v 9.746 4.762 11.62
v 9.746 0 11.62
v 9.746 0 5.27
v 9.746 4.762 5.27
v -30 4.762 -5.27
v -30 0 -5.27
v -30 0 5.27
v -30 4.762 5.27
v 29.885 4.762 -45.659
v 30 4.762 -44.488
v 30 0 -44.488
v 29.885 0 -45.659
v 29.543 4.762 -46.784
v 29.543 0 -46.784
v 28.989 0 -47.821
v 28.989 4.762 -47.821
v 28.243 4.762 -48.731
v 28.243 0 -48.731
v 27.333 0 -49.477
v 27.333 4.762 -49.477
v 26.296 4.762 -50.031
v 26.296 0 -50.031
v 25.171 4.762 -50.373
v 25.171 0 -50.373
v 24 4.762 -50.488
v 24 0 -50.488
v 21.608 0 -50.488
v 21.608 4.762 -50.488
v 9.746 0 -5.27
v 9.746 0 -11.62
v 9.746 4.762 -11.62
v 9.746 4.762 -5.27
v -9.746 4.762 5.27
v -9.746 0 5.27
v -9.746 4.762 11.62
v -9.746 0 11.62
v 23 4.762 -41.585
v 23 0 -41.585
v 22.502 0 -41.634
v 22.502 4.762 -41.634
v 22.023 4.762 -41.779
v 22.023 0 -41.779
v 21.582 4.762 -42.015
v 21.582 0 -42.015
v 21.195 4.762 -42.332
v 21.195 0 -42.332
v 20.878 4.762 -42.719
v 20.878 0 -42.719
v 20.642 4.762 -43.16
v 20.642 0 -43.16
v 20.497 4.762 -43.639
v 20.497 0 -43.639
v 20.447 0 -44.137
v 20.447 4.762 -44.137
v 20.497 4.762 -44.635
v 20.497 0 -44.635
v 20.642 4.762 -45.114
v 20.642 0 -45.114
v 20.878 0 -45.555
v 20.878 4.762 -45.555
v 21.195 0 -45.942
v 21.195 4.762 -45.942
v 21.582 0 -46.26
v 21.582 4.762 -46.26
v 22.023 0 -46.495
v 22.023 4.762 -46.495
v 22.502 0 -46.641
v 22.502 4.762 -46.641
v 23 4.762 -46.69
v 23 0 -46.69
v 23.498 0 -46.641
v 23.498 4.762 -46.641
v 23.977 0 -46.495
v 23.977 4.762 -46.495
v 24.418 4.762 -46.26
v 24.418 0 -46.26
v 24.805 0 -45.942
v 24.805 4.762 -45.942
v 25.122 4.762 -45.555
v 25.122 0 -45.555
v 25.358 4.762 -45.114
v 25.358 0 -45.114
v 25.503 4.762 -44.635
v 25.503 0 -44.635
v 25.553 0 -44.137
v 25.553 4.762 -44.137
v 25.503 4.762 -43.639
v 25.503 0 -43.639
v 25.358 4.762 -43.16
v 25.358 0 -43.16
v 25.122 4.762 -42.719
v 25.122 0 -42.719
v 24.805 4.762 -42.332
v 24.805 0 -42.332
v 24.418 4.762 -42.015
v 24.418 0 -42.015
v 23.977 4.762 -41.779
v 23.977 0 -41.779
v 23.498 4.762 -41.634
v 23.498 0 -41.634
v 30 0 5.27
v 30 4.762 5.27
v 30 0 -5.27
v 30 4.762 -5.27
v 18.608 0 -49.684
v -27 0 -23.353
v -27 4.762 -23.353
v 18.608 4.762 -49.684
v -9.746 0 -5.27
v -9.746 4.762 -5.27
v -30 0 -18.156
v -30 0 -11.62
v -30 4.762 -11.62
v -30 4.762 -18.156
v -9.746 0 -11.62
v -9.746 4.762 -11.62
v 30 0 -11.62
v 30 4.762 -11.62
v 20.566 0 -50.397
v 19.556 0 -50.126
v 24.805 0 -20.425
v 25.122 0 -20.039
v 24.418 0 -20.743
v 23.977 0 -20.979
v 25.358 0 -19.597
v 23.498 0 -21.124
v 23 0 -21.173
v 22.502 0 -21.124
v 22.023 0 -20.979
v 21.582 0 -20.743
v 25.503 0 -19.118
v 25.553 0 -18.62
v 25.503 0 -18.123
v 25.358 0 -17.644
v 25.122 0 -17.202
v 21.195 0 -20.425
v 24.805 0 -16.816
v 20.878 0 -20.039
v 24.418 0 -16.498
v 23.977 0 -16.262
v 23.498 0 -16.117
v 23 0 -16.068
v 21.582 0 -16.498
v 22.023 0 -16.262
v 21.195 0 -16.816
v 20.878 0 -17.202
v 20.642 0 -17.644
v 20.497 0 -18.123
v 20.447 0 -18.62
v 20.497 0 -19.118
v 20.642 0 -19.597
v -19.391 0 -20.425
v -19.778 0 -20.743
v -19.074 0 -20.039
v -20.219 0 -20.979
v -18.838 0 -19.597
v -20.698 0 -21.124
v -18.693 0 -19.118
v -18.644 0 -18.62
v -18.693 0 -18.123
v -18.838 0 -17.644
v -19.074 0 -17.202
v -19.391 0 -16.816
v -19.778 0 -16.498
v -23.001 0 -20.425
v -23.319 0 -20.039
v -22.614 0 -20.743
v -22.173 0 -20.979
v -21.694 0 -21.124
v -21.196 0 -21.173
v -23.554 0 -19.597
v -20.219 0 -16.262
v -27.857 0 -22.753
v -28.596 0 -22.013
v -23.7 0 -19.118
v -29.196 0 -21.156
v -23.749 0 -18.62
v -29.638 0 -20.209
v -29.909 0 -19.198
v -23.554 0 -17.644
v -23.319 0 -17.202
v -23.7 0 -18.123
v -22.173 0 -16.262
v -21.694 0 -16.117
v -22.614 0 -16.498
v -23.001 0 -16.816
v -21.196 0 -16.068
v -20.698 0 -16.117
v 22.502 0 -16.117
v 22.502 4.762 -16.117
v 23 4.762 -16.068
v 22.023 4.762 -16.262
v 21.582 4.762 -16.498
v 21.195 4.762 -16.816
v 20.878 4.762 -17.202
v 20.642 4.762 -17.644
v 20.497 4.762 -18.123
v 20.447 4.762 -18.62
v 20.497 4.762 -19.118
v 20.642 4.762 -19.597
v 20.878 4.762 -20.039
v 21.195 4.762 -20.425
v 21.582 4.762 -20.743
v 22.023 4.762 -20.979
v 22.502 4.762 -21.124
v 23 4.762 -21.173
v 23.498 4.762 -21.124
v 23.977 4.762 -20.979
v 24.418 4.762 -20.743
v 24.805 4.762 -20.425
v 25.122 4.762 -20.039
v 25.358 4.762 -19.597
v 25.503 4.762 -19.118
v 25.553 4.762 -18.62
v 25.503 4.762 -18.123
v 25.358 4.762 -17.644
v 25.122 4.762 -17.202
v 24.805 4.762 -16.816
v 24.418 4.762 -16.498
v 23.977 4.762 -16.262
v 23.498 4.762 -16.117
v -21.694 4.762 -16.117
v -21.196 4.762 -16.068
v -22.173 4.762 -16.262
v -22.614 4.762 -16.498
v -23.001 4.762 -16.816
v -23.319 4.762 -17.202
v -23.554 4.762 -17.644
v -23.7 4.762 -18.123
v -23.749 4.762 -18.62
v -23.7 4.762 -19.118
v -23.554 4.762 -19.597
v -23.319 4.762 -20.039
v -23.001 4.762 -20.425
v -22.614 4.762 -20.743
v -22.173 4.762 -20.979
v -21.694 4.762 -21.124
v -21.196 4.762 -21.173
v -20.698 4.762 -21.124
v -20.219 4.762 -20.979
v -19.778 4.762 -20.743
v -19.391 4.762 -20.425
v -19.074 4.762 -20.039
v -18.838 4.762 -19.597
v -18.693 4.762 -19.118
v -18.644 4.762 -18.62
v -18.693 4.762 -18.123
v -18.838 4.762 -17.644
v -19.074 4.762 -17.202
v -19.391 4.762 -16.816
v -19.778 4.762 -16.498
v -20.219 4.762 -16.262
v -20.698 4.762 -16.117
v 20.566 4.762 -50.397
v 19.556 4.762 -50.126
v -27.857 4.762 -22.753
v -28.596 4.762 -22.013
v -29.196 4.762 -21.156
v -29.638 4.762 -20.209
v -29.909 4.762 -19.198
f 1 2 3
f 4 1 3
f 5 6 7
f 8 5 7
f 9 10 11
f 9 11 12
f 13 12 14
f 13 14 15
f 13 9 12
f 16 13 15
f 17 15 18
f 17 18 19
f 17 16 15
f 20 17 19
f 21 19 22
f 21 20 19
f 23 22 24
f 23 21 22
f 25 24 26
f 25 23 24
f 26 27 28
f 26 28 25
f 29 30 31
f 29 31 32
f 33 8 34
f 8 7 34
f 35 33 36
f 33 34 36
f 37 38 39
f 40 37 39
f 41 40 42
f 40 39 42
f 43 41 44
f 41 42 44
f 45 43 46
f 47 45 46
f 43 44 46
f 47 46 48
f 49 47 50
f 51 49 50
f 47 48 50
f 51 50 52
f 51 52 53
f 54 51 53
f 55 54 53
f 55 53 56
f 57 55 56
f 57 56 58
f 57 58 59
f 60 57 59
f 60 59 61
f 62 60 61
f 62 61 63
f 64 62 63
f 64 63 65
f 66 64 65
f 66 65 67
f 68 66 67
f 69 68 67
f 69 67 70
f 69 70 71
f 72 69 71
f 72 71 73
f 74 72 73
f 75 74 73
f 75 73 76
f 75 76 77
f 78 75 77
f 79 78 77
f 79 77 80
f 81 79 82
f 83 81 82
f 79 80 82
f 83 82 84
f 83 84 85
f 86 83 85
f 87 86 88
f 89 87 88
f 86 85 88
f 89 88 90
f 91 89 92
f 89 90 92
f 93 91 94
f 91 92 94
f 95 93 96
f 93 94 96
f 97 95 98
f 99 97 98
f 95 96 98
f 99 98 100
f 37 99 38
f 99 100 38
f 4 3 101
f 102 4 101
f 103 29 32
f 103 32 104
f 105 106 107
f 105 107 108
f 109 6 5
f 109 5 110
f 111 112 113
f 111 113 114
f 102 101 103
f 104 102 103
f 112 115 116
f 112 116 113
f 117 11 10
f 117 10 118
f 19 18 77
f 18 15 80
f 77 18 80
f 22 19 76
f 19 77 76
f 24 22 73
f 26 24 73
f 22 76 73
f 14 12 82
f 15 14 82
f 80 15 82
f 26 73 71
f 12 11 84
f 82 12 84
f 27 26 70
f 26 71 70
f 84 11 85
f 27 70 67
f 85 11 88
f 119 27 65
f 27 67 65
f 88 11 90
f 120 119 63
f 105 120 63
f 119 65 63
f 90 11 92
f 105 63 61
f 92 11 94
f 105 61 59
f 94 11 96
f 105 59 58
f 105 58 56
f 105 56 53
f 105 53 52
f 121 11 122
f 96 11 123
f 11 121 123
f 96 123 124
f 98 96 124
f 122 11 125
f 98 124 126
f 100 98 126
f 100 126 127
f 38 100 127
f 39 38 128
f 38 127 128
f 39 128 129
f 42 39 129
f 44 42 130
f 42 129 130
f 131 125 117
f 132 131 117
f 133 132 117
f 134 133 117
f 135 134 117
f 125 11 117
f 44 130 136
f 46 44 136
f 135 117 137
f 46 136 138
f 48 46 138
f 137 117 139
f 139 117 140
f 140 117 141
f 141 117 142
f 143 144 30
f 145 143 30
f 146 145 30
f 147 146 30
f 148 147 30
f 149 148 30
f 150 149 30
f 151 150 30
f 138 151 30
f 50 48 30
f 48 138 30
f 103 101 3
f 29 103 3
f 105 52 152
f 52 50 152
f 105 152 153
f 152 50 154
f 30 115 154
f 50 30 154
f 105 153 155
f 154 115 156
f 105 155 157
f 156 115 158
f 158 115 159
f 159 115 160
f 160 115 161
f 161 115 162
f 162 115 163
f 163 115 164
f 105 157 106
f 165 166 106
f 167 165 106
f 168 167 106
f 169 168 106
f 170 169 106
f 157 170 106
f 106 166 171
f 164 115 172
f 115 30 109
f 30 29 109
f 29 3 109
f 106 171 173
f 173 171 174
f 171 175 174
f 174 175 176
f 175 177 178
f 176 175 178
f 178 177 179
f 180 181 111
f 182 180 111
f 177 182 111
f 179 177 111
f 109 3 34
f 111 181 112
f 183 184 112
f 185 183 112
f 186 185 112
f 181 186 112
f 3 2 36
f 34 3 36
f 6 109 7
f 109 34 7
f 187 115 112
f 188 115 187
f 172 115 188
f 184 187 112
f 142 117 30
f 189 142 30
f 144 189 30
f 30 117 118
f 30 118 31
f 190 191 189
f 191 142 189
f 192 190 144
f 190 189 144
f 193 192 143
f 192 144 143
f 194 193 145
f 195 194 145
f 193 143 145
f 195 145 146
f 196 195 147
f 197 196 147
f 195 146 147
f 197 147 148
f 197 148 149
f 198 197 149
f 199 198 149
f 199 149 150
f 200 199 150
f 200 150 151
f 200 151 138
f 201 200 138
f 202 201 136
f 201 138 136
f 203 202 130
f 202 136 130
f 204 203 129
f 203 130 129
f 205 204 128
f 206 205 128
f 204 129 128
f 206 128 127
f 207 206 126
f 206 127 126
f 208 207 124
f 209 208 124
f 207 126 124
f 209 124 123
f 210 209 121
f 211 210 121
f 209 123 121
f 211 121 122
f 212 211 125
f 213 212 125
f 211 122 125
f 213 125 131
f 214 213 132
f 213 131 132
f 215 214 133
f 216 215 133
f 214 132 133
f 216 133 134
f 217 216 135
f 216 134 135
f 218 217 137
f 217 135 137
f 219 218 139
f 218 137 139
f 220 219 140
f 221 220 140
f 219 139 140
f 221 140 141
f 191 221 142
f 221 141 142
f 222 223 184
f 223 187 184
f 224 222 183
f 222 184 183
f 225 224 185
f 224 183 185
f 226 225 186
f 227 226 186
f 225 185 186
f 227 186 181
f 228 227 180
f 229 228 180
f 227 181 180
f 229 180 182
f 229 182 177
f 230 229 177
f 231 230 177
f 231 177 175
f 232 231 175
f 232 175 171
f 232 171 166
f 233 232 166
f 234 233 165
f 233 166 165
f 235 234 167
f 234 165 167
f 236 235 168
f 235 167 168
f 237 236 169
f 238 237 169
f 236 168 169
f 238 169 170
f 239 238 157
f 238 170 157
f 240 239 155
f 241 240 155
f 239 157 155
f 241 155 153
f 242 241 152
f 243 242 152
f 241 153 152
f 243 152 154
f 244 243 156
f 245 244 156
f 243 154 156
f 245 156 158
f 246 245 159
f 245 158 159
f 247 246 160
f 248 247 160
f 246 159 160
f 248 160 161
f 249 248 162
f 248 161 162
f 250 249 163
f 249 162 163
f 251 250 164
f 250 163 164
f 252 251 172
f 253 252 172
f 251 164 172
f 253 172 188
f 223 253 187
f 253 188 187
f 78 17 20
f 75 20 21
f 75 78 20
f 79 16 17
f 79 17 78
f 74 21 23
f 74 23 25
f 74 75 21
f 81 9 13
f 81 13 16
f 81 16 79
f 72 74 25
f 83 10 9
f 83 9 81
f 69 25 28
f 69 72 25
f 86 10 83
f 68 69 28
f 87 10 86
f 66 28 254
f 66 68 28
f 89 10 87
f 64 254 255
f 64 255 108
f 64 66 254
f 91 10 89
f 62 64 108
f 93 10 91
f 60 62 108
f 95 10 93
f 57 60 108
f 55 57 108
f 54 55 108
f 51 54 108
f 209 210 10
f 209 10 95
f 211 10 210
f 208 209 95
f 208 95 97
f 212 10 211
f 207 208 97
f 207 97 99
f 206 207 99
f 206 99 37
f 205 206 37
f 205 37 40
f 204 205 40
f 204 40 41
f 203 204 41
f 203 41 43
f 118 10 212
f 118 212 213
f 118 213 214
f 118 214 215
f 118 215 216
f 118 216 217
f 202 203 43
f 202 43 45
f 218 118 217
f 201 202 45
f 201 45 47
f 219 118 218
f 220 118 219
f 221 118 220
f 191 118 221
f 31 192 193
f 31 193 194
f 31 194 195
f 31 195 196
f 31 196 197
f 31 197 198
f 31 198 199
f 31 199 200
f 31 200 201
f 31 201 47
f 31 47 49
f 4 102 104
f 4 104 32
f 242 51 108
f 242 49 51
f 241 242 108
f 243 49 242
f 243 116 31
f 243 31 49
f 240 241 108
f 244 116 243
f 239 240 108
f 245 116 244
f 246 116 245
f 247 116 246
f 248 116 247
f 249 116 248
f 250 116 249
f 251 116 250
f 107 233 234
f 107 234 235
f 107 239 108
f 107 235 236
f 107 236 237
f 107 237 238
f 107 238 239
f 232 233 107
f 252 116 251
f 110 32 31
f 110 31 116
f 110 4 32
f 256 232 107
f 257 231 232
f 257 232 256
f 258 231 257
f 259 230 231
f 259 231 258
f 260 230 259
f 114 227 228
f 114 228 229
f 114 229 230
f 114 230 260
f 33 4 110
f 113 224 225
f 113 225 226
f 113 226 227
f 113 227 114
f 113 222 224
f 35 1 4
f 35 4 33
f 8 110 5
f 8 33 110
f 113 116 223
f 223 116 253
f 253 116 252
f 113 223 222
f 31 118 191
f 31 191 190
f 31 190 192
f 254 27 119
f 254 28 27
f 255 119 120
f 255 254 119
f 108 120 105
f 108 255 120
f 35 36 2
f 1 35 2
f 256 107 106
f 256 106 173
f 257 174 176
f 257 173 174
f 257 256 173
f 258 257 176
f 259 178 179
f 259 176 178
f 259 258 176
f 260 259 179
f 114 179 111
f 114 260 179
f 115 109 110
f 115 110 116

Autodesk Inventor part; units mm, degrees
ref_plane "YZ Plane" through (0, 0, 0) normal (1, 0, 0) x (0, 1, 0)
ref_plane "XZ Plane" through (0, 0, 0) normal (0, 1, 0) x (-1, 0, 0)
ref_plane "XY Plane" through (0, 0, 0) normal (0, 0, 1) x (1, 0, 0)
sketch "Sketch1" plane through (0, 0, 0) normal (0, 1, 0) x (-1, 0, 0)
  line L0 (-30, -11.6205) -> (30, -11.6205)
  line L1 (30, -11.6205) -> (30, 11.6205)
  line L2 (30, 11.6205) -> (-30, 11.6205)
  line L3 (-30, 11.6205) -> (-30, -11.6205)
  line L4 (-30, -11.6205) -> (30, 11.6205) construction
  line L5 (30, -11.6205) -> (-30, 11.6205) construction
  line L6 (-9.746, 11.6205) -> (-9.746, 5.2705)
  line L7 (-9.746, 5.2705) -> (-30, 5.2705)
  line L8 (30, 5.2705) -> (9.746, 5.2705)
  line L9 (9.746, 5.2705) -> (9.746, 11.6205)
  line L10 (30, 0) -> (0, 0) construction
  line L11 (-9.746, -11.6205) -> (-9.746, -5.2705)
  line L12 (-9.746, -5.2705) -> (-30, -5.2705)
  line L13 (30, -5.2705) -> (9.746, -5.2705)
  line L14 (9.746, -5.2705) -> (9.746, -11.6205)
  line L15 (30, -11.6205) -> (30, -21.6205)
  line L16 (30, -21.6205) -> (-20, -50.488)
  line L17 (-20, -50.488) -> (-30, -50.488)
  line L18 (-30, -50.488) -> (-30, -11.6205)
  dimension "d0" = 20.254
  dimension "d1" = 20.254
  dimension "d2" = 6.35
  dimension "d3" = 60
  dimension "d4" = 23.241
  dimension "d5" = 10
  dimension "d6" = 10
  dimension "d7" = 60
extrude "Plate1" add sketch "Sketch1" along normal blind 4.7625 contours L0 L15 L16 L17 L18 | L11 L12 L3 L7 L6 L2 L9 L8 L1 L13 L14 L0
fillet "Corner Round1" radius 6 3 edges at (-30, 2.3813, -21.6205) (20, 2.3813, -50.488) (30, 2.3813, -50.488)
sketch "Sketch2" plane through (0, 4.7625, 0) normal (0, 1, 0) x (1, 0, 0)
  line L0 (-21.1962, 18.6205) -> (23, 18.6205)
  line L1 (23, 18.6205) -> (23, 44.1372)
  line L2 (23, 44.1372) -> (-21.1962, 18.6205)
  line L3 (-27, 23.3526) -> (18.6077, 49.6842) projected
  line L4 (-9.746, 11.6205) -> (-30, 11.6205) projected
  line L5 (30, 44.488) -> (30, 11.6205) projected
  point P0 (0, 0)
  dimension "d10" = 7
  dimension "d11" = 7
  dimension "d12" = 7
hole "Hole1" at (-21.1962, 4.7625, -18.6205) at (23, 4.7625, -18.6205) at (23, 4.7625, -44.1372) direction (0, -1, 0) diameter 5.105 end through all clearance for "Socket Head Cap Screw" size "#10" standard "Ansi Unified Screw Threads"
equation "\"d1\" = d0"
equation "\"d6\" = d5"
equation "\"d11\" = d10"
equation "\"d12\" = d10"
equation "\"d18\" = Thickness"
equation "\"d8\" = Thickness"
equation "\"BendRadius\" = Thickness"
equation "\"BendReliefWidth\" = Thickness"
equation "\"BendReliefDepth\" = 0.5 * Thickness"
equation "\"CornerReliefSize\" = 4 * Thickness"
equation "\"MinimumRemnant\" = 2 * Thickness"
equation "\"TransitionRadius\" = BendRadius"
equation "\"JacobiRadiusSize\" = BendRadius"
equation "\"GapSize\" = Thickness"
equation "\"Thickness\" = 4.7625"
properties part number "INTAKE_BACK_MOUNT_PLATE" material "Aluminum, 6061-T6"
